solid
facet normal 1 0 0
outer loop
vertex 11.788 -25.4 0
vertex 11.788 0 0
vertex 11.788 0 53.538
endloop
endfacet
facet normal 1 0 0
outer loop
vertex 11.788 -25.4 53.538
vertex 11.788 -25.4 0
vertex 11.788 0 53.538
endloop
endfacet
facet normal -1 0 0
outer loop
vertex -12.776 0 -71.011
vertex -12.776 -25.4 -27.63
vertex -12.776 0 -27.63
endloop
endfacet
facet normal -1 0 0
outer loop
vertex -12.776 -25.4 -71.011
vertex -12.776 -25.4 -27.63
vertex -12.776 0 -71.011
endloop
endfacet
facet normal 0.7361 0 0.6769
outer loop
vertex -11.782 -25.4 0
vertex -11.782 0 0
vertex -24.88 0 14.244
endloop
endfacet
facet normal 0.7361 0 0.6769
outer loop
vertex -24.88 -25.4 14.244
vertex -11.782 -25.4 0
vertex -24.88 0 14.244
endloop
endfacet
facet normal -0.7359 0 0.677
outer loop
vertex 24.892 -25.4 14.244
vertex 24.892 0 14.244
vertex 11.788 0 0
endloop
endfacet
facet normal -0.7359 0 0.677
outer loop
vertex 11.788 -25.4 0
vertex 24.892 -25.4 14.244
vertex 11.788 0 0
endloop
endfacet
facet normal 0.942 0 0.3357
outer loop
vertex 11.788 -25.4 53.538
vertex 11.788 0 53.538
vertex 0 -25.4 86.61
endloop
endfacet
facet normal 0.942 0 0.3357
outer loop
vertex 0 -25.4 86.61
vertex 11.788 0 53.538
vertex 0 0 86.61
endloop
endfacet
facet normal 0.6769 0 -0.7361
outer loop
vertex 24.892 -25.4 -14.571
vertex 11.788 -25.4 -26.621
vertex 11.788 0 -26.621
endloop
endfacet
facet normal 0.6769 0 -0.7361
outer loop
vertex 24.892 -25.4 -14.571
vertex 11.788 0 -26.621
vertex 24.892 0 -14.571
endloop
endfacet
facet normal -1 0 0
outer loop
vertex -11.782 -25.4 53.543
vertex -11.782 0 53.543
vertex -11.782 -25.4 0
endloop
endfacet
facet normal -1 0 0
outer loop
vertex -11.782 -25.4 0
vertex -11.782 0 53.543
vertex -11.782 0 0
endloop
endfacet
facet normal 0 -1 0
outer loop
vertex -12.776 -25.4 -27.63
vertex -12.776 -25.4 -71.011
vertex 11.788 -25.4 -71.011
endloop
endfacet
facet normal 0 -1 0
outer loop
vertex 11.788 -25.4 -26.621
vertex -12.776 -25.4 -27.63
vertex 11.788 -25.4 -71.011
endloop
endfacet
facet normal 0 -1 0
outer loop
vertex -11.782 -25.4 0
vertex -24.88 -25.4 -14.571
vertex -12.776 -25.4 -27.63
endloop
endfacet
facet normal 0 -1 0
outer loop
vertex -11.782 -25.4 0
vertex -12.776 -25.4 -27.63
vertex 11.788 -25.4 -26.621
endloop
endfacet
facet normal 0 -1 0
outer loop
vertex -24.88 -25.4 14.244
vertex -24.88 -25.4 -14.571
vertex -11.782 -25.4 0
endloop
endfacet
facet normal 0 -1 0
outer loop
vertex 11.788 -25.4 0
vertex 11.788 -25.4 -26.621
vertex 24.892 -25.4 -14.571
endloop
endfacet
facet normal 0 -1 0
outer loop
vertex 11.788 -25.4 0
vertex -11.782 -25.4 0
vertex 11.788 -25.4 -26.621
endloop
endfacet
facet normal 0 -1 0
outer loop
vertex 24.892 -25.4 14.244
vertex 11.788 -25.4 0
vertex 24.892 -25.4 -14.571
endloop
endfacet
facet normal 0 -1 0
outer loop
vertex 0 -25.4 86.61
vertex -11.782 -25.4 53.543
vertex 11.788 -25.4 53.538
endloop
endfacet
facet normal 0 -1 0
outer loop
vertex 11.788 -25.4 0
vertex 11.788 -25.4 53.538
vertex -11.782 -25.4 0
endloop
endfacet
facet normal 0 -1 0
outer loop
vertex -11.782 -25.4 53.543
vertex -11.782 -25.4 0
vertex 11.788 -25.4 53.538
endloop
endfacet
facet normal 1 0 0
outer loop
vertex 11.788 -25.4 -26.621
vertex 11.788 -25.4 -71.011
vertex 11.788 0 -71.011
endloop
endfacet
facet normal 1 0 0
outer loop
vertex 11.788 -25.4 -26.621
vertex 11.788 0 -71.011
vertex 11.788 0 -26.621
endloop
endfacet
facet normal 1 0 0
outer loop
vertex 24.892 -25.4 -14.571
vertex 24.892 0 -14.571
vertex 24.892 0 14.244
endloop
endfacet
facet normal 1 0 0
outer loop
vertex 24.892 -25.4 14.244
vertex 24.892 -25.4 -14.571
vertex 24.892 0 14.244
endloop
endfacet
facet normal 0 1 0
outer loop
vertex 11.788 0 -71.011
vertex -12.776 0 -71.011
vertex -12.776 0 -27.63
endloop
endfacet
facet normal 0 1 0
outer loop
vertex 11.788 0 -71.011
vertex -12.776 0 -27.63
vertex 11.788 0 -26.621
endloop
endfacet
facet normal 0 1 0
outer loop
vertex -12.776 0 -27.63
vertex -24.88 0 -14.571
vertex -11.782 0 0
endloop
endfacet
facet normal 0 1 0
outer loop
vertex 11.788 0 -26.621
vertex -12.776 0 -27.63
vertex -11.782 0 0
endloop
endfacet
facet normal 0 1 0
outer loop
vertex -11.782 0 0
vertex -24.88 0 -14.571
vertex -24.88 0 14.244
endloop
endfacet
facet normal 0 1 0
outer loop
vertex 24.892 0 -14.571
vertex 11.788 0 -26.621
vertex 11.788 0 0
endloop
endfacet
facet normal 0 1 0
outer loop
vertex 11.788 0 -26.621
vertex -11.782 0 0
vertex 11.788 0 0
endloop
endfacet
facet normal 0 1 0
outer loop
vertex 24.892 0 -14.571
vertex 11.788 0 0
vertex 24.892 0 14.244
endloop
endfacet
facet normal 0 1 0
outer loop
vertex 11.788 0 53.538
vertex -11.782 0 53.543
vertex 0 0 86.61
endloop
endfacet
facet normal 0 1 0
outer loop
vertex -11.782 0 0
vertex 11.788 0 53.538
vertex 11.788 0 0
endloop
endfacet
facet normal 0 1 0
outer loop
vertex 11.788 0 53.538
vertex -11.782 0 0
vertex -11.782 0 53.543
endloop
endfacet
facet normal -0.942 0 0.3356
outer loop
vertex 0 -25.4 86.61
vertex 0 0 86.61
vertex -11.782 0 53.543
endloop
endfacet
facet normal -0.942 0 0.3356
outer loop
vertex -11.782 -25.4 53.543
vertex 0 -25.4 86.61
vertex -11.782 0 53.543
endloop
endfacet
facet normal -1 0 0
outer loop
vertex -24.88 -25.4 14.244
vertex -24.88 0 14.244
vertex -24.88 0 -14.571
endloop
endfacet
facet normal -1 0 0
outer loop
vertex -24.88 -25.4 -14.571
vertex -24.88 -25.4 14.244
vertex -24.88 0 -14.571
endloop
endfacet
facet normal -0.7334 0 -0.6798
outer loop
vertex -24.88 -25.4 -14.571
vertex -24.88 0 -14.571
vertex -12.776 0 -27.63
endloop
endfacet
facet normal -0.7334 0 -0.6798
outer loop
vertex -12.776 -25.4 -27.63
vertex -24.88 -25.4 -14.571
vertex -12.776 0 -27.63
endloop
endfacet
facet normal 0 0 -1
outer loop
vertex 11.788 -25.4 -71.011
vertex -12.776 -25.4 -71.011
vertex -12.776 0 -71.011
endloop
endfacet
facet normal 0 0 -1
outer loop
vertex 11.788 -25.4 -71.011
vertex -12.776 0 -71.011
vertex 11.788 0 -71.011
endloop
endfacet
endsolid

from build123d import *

# Parameters (mm, degrees)
F1_DEPTH = 25.4
F3_DEPTH = 25.4


# Not quite as in the source:
# - a feature names something its author has since deleted; it is built from what else it names


with BuildPart() as f1:
    # F0 (on Front) → F1 (new body)
    with BuildSketch(Plane.XZ):
        Polygon((11.7880795151, 53.5375215113), (0, 86.6096317768), (-11.7820905356, 53.5432), (-11.7820905356, 0), (-24.8799551113, 14.2439296469), (-24.8799551113, -14.5713714883), (-12.7764736156, -27.6303915451), (-12.7764736156, -39.4159915451), (11.7880795151, -39.4159915451), (11.7880795151, -26.6211631082), (24.8922296689, -14.5713714883), (24.8922296689, 14.2439296469), (11.7880795151, 0), align=None)
    extrude(amount=F1_DEPTH)

    # F2 (on face) → F3 (join)
    with BuildSketch(Plane.XZ.offset(25.4)):
        Polygon((-0.4971447281, -47.3129446821), (-12.7764736156, -55.2061082793), (-0.4912507866, -63.1106432249), (11.7880795151, -55.2136891784), align=None)
        Polygon((11.7880795151, -39.4159915451), (-12.7764736156, -39.4159915451), (-0.4971447281, -47.3129446821), align=None)
        Polygon((-0.4912507866, -63.1106432249), (-12.7764736156, -71.0113868117), (11.7880795151, -71.0113868117), align=None)
        Polygon((11.7880795151, -39.4159915451), (-0.4971447281, -47.3129446821), (11.7880795151, -55.2136891784), align=None)
        Polygon((-0.4971447281, -47.3129446821), (-12.7764736156, -39.4159915451), (-12.7764736156, -55.2061082793), align=None)
        Polygon((11.7880795151, -55.2136891784), (-0.4912507866, -63.1106432249), (11.7880795151, -71.0113868117), align=None)
        Polygon((-0.4912507866, -63.1106432249), (-12.7764736156, -55.2061082793), (-12.7764736156, -71.0113868117), align=None)
    extrude(amount=-F3_DEPTH)


solid = f1.part
